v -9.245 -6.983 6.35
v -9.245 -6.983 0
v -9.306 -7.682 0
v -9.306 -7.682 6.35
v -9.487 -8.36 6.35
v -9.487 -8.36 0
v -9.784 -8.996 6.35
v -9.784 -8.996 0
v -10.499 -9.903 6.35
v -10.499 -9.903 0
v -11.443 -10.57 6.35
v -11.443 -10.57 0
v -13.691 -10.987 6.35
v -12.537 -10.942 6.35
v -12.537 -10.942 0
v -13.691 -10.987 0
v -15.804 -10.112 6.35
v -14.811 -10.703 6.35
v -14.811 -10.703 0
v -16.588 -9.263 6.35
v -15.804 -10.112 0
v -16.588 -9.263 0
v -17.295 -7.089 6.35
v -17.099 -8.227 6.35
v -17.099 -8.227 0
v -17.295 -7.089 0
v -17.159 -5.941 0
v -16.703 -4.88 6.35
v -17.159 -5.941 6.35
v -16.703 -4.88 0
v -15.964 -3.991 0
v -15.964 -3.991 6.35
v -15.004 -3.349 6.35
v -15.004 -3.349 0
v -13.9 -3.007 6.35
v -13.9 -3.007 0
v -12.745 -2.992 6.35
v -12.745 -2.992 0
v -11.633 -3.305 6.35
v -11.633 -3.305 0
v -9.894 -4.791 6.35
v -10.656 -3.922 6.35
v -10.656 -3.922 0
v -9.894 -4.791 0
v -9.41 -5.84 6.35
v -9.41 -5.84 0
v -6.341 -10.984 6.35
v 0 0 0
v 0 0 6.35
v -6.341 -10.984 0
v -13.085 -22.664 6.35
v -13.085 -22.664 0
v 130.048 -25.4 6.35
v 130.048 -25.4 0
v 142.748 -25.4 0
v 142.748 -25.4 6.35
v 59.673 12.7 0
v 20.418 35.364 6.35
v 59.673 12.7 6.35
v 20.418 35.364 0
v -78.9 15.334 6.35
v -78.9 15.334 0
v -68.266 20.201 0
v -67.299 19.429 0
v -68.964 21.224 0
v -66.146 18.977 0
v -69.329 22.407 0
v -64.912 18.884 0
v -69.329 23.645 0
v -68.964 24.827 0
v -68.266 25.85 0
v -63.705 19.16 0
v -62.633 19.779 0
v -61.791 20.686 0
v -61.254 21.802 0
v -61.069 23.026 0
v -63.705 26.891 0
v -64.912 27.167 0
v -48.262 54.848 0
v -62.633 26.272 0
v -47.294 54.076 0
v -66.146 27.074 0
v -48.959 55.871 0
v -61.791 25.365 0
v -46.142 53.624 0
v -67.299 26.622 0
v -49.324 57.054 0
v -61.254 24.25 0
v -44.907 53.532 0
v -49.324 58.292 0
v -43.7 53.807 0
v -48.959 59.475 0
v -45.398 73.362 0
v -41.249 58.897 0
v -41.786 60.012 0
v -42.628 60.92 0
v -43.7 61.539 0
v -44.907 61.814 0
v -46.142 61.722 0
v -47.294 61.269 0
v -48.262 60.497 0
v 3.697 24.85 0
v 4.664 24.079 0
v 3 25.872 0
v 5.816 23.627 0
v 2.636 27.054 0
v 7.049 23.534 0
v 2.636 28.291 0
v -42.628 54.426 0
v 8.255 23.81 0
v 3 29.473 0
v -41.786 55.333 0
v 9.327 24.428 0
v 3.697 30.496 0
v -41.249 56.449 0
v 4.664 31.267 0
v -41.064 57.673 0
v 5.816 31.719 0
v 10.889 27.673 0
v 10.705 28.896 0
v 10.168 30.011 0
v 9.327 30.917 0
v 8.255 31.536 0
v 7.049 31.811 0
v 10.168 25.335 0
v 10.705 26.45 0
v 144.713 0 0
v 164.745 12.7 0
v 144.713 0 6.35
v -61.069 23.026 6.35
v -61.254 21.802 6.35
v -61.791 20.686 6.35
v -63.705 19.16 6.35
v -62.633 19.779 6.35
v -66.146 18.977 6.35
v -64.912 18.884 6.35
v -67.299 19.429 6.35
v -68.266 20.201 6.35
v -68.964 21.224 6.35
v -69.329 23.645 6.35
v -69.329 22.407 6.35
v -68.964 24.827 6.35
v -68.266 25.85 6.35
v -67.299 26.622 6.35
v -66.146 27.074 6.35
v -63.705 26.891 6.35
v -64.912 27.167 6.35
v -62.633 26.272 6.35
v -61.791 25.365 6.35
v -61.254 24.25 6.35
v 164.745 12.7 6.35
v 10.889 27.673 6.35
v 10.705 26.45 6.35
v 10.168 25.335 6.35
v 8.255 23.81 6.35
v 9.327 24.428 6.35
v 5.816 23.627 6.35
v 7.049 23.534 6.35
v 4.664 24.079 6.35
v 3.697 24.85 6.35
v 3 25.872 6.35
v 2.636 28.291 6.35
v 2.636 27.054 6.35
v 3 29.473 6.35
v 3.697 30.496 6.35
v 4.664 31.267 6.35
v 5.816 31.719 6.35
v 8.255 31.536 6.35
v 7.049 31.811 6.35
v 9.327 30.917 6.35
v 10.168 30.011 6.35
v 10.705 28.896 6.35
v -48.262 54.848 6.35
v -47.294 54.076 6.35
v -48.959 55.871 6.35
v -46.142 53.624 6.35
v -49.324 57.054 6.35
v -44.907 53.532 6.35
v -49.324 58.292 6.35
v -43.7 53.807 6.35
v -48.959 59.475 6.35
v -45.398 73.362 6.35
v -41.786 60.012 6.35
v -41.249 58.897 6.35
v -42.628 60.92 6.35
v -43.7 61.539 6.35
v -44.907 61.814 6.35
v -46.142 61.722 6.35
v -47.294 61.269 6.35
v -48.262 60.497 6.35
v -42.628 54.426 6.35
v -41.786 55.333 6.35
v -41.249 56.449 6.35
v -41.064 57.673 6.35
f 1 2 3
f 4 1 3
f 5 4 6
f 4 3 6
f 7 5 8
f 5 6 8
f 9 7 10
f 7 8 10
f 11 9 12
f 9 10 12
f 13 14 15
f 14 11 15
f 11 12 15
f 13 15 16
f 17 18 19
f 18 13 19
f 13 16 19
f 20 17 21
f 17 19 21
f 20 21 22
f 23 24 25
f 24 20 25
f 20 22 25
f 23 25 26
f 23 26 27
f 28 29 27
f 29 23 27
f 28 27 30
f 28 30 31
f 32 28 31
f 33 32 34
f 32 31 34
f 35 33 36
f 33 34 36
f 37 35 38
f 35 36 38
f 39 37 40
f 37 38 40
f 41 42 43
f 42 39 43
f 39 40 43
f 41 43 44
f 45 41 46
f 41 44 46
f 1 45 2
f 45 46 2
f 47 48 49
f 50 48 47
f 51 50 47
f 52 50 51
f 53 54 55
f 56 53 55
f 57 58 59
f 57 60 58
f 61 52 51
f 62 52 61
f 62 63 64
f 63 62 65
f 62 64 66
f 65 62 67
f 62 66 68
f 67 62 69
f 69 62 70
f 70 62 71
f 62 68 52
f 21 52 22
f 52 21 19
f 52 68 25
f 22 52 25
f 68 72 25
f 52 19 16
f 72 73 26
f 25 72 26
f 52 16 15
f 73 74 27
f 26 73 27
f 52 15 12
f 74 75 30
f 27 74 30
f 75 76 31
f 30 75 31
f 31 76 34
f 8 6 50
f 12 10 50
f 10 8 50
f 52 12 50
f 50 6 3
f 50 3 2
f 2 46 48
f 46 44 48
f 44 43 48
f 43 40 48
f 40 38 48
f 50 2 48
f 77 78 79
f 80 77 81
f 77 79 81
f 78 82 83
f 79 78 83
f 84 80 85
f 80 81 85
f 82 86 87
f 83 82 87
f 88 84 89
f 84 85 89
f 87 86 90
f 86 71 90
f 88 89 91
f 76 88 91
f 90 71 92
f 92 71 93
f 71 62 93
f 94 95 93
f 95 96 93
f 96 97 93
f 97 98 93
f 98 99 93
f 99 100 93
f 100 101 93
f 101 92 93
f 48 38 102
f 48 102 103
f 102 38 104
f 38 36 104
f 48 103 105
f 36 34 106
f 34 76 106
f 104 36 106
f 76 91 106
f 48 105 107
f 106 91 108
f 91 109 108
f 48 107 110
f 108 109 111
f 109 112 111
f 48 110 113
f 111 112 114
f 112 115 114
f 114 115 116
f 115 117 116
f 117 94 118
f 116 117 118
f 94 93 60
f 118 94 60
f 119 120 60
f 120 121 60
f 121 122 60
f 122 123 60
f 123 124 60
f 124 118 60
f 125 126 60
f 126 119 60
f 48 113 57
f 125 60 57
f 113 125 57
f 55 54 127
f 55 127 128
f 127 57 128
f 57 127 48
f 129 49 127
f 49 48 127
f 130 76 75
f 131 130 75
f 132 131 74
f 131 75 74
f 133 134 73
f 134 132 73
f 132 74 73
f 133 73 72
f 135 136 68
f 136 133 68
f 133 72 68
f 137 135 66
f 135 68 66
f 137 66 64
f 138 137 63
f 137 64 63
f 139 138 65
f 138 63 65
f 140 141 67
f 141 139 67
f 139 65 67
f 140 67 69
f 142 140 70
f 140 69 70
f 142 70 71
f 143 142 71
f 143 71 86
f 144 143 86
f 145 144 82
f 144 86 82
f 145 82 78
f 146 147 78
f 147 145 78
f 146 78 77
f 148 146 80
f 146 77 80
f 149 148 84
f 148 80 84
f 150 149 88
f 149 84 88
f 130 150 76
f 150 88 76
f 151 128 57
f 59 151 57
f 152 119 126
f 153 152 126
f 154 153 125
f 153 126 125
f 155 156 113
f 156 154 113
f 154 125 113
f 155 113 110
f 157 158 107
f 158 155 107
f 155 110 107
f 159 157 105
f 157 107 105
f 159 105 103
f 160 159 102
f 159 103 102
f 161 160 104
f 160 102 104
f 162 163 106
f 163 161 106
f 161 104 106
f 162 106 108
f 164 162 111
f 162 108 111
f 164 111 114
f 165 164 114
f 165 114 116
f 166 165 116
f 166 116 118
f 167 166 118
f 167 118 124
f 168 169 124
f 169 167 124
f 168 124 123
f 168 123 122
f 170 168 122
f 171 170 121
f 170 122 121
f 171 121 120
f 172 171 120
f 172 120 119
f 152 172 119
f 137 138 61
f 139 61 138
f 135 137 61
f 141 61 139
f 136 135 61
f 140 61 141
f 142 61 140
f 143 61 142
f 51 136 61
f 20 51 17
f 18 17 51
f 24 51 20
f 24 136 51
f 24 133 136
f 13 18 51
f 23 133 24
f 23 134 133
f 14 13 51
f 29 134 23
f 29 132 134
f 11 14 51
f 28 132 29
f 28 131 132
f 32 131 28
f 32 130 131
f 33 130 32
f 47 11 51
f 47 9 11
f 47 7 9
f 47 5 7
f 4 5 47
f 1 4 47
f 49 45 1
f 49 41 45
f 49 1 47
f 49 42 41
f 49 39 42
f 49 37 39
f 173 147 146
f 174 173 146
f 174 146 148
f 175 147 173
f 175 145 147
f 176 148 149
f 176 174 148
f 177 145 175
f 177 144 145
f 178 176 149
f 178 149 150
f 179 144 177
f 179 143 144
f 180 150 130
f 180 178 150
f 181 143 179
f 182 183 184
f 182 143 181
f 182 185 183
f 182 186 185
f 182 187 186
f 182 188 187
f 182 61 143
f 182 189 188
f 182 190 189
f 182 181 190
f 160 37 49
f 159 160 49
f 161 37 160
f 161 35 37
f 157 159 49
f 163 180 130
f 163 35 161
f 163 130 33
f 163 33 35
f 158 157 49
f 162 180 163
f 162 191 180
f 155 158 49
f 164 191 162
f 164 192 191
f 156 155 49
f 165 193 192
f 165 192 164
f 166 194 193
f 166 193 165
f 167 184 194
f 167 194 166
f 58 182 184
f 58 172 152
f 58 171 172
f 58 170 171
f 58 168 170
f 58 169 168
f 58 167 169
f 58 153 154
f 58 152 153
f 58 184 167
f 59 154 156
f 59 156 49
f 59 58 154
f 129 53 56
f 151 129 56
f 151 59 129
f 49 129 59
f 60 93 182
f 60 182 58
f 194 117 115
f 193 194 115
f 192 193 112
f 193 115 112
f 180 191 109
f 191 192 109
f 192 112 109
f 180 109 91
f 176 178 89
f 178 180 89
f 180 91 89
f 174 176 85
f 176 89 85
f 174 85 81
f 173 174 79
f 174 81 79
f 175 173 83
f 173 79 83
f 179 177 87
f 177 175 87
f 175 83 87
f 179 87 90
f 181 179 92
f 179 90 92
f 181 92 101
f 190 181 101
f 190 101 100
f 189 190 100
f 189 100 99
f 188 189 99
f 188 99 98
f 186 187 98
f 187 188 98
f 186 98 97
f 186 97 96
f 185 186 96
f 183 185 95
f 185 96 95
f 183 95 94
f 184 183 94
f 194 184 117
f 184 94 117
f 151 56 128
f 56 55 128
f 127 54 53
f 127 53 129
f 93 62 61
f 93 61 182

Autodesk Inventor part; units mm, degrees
ref_plane "YZ Plane" through (0, 0, 0) normal (1, 0, 0) x (0, 1, 0)
ref_plane "XZ Plane" through (0, 0, 0) normal (0, 1, 0) x (-1, 0, 0)
ref_plane "XY Plane" through (0, 0, 0) normal (0, 0, 1) x (1, 0, 0)
sketch "Sketch1" plane through (0, 0, 0) normal (0, 0, 1) x (1, 0, 0)
  line L0 (0, 0) -> (130.048, 0)
  line L1 (87.9024, 12.7) -> (59.6729, 12.7)
  line L2 (87.9024, 12.7) -> (130.048, 12.7)
  line L3 (130.048, 12.7) -> (130.048, 0)
  line L4 (130.048, -25.4) -> (142.748, -25.4)
  line L5 (130.048, -25.4) -> (144.7127, 0)
  line L6 (142.748, -25.4) -> (164.745, 12.7)
  line L7 (144.7127, 0) -> (130.048, 0)
  line L8 (130.048, 12.7) -> (164.745, 12.7)
  line L9 (0, 0) -> (7.3323, 12.7)
  line L10 (3.6662, 6.35) -> (20.4175, 35.3641)
  line L11 (3.6662, 6.35) -> (-13.0851, -22.6641)
  line L12 (-13.0851, -22.6641) -> (-78.9003, 15.3343)
  line L13 (-78.9003, 15.3343) -> (-45.3977, 73.3625)
  line L14 (-45.3977, 73.3625) -> (20.4175, 35.3641)
  line L15 (20.4175, 35.3641) -> (59.6729, 12.7)
  line L16 (20.4175, 35.3641) -> (13.4893, 39.3641)
  circle A0 centre (6.7393, 27.6728) radius 4.15
  line L17 (-78.9003, 15.3343) -> (-71.9721, 11.3343)
  circle A1 centre (-65.2221, 23.0256) radius 4.1529
  line L18 (-45.3977, 73.3625) -> (-38.4686, 69.362)
  circle A2 centre (-45.2174, 57.6728) radius 4.1529
  line L19 (-13.0851, -22.6641) -> (-6.3414, -10.9837)
  line L20 (-6.3414, -10.9837) -> (-13.2705, -6.9832)
  circle A3 centre (-13.2705, -6.9832) radius 4.0259
  dimension "d39" = 130.048
  dimension "d41" = 25.4
  dimension "d42" = 12.7
  dimension "d43" = 60
  dimension "d44" = 60
  dimension "d45" = 12.7
  dimension "d51" = 136.3234
  dimension "d54" = 136.3234
  dimension "d55" = 12.7
  dimension "d56" = 66.5476
  dimension "d57" = 33.5026
  dimension "d58" = 33.5026
  dimension "d59" = 75.9968
  dimension "d60" = 40.8349
  dimension "d61" = 8
  dimension "d63" = 8.3
  dimension "d64" = 8
  dimension "d66" = 8.3058
  dimension "d69" = 8.001
  dimension "d70" = 13.5
  dimension "d72" = 8.3058
  dimension "d73" = 13.4874
  dimension "d74" = 8.001
  dimension "d75" = 90
  dimension "d76" = 8.0518
extrude "Extrusion2" add sketch "Sketch1" along normal blind 6.35
properties part number "hook" material "Steel"
